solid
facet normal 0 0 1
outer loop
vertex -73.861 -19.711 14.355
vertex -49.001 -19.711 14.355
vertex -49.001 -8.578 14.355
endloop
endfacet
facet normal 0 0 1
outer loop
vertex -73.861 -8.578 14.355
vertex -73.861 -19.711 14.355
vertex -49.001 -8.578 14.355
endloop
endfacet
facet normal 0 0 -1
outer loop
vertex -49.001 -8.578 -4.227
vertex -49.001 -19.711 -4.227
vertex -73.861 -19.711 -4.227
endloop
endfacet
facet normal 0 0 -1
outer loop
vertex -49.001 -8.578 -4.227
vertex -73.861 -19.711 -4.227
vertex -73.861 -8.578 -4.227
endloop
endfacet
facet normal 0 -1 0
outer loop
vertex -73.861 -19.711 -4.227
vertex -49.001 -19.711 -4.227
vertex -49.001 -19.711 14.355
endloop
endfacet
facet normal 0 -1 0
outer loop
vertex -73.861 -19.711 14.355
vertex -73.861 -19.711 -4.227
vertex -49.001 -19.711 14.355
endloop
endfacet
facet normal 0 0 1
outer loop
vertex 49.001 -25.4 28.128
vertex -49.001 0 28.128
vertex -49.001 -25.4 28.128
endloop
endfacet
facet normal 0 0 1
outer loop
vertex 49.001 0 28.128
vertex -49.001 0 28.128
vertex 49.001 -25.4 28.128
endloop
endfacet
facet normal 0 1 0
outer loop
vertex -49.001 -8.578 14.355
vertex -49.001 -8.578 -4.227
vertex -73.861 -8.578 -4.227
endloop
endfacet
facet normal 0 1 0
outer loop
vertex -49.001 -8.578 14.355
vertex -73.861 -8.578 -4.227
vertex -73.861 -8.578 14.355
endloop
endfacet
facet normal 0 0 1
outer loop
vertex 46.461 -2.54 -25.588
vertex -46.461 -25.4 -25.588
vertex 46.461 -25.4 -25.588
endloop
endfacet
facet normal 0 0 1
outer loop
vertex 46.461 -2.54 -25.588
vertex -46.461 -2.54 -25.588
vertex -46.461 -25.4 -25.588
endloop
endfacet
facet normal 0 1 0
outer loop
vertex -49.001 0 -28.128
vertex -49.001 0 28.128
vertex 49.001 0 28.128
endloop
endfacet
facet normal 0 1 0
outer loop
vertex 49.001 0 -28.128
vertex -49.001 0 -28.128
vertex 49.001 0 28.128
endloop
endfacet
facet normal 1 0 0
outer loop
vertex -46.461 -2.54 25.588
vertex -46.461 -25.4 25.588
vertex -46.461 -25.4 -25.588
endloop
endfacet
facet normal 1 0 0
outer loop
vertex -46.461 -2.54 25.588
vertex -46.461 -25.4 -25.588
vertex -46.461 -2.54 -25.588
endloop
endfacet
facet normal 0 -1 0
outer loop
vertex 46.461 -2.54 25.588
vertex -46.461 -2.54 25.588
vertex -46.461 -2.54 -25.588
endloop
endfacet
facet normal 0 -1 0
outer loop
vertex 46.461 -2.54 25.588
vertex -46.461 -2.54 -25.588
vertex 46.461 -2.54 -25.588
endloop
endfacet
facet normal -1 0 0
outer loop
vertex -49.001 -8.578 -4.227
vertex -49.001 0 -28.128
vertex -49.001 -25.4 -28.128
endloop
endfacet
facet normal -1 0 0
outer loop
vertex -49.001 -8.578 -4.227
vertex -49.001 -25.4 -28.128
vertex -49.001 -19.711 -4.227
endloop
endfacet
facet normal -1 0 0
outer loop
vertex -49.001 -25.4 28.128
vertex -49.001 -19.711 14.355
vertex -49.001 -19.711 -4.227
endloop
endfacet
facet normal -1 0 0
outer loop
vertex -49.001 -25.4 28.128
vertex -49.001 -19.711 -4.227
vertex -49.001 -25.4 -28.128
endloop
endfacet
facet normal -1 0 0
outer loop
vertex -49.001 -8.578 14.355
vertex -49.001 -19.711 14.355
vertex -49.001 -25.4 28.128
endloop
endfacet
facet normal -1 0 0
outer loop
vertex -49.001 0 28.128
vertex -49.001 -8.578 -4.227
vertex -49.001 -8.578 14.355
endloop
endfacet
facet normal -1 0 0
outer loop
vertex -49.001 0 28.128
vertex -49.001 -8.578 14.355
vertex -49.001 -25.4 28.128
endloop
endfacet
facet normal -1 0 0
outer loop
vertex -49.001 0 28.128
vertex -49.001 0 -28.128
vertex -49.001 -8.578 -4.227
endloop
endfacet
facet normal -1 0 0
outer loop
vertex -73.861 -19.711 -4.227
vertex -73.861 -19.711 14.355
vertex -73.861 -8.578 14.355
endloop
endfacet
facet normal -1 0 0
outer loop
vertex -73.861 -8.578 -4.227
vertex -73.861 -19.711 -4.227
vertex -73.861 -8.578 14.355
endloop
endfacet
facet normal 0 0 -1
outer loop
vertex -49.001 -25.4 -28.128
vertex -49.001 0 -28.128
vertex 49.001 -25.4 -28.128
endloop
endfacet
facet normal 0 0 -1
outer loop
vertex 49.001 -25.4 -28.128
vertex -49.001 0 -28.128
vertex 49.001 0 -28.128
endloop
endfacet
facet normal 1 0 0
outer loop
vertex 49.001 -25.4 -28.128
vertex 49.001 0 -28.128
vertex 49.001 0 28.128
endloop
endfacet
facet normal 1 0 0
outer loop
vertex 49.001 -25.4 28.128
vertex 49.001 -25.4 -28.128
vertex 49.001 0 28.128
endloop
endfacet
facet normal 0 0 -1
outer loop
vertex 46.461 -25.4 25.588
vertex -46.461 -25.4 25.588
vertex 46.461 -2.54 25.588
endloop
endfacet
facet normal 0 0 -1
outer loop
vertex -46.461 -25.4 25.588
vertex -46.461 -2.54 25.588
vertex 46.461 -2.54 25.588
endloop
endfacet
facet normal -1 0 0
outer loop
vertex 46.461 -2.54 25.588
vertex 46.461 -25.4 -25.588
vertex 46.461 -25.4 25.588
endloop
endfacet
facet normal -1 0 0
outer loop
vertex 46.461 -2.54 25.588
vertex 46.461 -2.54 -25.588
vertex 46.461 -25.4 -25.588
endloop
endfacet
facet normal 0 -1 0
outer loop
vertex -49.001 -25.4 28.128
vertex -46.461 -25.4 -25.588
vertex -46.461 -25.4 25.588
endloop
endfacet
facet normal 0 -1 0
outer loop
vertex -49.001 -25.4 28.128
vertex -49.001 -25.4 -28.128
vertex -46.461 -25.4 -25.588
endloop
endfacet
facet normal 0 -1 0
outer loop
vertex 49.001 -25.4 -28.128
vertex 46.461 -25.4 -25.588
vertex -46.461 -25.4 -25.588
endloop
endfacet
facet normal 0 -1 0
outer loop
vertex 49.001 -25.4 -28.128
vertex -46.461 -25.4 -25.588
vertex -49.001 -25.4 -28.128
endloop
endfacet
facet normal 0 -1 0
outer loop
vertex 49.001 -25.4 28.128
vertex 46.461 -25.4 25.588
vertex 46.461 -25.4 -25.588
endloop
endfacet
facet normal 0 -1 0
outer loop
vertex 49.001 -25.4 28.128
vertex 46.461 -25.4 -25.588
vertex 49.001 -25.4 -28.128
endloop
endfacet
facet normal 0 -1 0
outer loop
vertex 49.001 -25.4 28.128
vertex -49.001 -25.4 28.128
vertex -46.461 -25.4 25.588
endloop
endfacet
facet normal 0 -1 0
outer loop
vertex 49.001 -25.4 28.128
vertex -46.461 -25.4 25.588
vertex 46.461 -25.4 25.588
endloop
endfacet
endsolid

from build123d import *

# Parameters (mm, degrees)
F0_W     = 98.002754
F0_H     = 56.256722
F1_DEPTH = 25.4
F2_T     = -2.54
F3_W     = 11.132365
F3_H     = 18.58267
F4_DEPTH = 27.40012


with BuildPart() as f1:
    # F0 (on Front) → F1 (new body)
    with BuildSketch(Plane.XZ):
        Rectangle(F0_W, F0_H)
    extrude(amount=F1_DEPTH)

    # F2
    f2_openings = [f1.faces().sort_by_distance(p)[0] for p in [
        (0, -25.4, 0),
    ]]
    offset(amount=F2_T, openings=f2_openings)

    # F3 (on face) → F4 (join)
    with BuildSketch(Plane.YZ.offset(-46.461377)):
        with Locations((-14.144399, 5.063872)):
            Rectangle(F3_W, F3_H)
    extrude(amount=-F4_DEPTH)


solid = f1.part
